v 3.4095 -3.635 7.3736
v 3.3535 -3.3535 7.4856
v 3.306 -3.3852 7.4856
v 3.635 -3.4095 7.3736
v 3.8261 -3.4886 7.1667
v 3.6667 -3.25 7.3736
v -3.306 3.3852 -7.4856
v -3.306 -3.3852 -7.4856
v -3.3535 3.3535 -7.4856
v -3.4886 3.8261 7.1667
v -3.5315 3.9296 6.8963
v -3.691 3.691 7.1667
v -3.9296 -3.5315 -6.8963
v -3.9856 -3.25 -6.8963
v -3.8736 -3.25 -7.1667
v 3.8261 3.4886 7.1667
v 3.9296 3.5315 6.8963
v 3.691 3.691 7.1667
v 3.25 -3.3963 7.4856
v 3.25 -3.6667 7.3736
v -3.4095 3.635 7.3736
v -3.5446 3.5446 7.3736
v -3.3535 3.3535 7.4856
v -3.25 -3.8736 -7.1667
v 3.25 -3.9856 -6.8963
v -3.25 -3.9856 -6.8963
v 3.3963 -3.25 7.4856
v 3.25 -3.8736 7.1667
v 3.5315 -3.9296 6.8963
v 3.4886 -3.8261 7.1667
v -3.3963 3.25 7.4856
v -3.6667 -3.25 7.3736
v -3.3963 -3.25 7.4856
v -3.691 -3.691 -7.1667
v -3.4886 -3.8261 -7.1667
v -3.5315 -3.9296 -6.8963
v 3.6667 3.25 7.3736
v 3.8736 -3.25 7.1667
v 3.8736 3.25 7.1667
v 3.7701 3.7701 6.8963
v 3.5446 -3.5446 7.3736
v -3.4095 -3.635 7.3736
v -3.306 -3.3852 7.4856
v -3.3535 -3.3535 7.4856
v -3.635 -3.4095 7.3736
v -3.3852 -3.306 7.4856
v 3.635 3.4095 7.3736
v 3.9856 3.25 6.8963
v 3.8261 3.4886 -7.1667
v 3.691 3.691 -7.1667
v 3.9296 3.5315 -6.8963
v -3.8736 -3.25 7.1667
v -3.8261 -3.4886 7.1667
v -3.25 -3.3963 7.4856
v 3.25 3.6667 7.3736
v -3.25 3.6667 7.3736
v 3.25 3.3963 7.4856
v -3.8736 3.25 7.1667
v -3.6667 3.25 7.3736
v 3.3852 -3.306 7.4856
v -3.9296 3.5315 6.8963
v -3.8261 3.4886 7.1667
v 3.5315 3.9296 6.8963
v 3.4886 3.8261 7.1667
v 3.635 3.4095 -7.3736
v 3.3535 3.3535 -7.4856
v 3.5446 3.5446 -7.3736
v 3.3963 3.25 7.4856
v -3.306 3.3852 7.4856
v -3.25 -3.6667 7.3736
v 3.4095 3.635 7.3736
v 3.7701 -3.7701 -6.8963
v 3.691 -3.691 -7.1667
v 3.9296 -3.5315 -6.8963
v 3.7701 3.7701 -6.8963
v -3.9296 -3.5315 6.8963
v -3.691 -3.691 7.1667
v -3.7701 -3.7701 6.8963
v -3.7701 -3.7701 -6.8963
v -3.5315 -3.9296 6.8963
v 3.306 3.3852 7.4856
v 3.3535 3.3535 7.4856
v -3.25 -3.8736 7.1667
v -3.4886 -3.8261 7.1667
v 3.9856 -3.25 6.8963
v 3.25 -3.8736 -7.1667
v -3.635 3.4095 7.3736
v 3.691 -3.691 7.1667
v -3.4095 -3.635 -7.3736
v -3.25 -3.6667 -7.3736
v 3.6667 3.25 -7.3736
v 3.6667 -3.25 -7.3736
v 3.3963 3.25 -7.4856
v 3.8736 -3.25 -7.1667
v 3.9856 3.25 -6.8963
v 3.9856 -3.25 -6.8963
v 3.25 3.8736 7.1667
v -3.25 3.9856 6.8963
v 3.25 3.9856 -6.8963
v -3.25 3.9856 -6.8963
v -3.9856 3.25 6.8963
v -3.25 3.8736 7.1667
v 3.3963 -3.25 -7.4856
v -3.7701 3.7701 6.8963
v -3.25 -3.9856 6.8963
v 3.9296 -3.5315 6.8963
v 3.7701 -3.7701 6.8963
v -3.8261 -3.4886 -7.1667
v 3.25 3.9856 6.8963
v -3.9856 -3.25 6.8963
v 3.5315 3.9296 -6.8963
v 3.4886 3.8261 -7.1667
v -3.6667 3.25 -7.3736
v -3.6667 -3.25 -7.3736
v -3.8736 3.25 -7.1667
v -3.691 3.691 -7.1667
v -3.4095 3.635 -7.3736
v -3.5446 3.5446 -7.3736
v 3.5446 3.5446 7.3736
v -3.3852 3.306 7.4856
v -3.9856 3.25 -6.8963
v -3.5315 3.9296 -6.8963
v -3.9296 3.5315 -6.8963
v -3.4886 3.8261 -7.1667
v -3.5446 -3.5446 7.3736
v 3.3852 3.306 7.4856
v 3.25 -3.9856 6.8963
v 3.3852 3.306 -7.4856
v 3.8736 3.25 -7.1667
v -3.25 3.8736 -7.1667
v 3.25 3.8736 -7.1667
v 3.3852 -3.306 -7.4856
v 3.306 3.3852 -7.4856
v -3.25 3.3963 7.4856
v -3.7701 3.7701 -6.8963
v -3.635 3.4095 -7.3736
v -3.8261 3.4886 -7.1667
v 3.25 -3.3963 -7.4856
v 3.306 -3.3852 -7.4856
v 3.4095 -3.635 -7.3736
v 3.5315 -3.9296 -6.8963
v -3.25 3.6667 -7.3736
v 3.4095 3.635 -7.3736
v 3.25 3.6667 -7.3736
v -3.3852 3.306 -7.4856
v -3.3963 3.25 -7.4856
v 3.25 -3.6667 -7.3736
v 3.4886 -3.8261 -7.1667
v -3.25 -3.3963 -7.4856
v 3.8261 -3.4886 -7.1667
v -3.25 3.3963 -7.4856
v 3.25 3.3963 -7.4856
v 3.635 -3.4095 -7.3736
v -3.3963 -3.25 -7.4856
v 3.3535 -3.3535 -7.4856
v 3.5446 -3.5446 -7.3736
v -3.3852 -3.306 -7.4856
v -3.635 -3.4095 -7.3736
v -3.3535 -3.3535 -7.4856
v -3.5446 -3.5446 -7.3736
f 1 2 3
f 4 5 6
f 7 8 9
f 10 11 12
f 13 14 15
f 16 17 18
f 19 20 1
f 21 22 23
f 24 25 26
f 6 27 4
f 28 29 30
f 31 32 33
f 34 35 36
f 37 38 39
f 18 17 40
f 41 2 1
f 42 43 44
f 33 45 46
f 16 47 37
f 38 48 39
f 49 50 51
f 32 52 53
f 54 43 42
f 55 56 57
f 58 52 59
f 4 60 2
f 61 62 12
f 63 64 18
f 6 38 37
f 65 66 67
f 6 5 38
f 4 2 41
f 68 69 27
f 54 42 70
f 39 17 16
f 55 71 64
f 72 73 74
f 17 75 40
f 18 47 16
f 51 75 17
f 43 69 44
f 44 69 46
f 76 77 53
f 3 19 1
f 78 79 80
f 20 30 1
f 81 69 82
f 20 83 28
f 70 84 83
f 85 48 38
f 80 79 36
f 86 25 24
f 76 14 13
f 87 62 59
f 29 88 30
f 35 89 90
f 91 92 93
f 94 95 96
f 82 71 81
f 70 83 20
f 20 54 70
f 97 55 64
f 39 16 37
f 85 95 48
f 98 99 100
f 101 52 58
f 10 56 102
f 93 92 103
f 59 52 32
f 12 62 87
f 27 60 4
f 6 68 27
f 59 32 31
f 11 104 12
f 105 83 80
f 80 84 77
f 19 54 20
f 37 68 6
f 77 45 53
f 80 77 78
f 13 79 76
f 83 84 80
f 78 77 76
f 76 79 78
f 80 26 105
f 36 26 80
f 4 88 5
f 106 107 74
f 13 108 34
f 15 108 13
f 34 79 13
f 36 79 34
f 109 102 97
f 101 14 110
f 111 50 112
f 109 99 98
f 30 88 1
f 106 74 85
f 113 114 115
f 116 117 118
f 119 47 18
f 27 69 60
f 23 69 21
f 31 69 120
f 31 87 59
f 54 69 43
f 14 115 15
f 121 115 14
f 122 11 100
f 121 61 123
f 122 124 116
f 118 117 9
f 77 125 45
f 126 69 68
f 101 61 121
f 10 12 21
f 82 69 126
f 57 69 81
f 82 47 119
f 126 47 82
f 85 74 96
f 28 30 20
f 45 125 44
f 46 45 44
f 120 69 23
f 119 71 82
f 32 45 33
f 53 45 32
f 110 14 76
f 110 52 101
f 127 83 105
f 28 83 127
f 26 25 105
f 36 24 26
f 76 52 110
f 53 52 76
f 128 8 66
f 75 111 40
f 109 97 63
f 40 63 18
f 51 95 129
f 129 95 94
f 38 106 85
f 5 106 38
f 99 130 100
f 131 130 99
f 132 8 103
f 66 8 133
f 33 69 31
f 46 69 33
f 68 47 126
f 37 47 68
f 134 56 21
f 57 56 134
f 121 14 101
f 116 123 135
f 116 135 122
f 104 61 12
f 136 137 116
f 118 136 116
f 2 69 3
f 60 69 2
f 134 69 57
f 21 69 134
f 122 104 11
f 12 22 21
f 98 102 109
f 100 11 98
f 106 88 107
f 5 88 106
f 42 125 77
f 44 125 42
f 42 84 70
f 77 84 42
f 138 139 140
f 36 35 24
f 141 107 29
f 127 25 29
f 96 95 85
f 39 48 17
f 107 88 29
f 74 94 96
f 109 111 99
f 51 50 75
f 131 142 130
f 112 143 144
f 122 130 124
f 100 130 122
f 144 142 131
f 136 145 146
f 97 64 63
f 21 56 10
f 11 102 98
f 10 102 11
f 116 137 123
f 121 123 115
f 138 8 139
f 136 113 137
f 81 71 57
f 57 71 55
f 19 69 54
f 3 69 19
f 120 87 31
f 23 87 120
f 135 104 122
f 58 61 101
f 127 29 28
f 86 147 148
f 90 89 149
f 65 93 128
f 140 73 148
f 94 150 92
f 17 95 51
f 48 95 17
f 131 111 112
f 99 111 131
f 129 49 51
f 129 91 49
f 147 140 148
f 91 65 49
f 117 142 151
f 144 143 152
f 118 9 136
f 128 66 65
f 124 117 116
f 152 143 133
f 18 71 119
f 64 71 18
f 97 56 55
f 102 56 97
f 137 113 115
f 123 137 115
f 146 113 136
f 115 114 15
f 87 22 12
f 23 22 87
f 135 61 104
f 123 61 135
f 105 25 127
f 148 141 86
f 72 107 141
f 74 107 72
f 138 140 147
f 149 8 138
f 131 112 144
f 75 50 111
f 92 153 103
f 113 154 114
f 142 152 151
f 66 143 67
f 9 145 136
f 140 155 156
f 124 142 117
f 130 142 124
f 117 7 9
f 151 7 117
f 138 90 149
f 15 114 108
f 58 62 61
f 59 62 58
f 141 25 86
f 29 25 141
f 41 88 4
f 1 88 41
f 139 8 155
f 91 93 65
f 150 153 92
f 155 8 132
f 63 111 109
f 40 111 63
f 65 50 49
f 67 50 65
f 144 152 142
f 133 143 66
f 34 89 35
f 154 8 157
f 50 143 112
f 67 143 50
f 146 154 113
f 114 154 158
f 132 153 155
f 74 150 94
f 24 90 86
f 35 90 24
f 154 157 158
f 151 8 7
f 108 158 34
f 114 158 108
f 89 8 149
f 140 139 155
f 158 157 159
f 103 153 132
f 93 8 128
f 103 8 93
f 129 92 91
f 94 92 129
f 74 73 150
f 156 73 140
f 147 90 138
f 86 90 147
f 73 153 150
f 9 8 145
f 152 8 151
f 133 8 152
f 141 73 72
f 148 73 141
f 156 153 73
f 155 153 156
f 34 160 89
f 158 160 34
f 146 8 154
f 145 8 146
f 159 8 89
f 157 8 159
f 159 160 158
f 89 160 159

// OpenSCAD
// Real form: server_rack_modular_v4/scad/parts/nas_joint_test_v53.scad:26.
minkowski() {
    cube([8 - 1.5, 8 - 1.5, 15 - 1.5], center = true);
    sphere(r = 1.5/2, $fn = 16);
}
